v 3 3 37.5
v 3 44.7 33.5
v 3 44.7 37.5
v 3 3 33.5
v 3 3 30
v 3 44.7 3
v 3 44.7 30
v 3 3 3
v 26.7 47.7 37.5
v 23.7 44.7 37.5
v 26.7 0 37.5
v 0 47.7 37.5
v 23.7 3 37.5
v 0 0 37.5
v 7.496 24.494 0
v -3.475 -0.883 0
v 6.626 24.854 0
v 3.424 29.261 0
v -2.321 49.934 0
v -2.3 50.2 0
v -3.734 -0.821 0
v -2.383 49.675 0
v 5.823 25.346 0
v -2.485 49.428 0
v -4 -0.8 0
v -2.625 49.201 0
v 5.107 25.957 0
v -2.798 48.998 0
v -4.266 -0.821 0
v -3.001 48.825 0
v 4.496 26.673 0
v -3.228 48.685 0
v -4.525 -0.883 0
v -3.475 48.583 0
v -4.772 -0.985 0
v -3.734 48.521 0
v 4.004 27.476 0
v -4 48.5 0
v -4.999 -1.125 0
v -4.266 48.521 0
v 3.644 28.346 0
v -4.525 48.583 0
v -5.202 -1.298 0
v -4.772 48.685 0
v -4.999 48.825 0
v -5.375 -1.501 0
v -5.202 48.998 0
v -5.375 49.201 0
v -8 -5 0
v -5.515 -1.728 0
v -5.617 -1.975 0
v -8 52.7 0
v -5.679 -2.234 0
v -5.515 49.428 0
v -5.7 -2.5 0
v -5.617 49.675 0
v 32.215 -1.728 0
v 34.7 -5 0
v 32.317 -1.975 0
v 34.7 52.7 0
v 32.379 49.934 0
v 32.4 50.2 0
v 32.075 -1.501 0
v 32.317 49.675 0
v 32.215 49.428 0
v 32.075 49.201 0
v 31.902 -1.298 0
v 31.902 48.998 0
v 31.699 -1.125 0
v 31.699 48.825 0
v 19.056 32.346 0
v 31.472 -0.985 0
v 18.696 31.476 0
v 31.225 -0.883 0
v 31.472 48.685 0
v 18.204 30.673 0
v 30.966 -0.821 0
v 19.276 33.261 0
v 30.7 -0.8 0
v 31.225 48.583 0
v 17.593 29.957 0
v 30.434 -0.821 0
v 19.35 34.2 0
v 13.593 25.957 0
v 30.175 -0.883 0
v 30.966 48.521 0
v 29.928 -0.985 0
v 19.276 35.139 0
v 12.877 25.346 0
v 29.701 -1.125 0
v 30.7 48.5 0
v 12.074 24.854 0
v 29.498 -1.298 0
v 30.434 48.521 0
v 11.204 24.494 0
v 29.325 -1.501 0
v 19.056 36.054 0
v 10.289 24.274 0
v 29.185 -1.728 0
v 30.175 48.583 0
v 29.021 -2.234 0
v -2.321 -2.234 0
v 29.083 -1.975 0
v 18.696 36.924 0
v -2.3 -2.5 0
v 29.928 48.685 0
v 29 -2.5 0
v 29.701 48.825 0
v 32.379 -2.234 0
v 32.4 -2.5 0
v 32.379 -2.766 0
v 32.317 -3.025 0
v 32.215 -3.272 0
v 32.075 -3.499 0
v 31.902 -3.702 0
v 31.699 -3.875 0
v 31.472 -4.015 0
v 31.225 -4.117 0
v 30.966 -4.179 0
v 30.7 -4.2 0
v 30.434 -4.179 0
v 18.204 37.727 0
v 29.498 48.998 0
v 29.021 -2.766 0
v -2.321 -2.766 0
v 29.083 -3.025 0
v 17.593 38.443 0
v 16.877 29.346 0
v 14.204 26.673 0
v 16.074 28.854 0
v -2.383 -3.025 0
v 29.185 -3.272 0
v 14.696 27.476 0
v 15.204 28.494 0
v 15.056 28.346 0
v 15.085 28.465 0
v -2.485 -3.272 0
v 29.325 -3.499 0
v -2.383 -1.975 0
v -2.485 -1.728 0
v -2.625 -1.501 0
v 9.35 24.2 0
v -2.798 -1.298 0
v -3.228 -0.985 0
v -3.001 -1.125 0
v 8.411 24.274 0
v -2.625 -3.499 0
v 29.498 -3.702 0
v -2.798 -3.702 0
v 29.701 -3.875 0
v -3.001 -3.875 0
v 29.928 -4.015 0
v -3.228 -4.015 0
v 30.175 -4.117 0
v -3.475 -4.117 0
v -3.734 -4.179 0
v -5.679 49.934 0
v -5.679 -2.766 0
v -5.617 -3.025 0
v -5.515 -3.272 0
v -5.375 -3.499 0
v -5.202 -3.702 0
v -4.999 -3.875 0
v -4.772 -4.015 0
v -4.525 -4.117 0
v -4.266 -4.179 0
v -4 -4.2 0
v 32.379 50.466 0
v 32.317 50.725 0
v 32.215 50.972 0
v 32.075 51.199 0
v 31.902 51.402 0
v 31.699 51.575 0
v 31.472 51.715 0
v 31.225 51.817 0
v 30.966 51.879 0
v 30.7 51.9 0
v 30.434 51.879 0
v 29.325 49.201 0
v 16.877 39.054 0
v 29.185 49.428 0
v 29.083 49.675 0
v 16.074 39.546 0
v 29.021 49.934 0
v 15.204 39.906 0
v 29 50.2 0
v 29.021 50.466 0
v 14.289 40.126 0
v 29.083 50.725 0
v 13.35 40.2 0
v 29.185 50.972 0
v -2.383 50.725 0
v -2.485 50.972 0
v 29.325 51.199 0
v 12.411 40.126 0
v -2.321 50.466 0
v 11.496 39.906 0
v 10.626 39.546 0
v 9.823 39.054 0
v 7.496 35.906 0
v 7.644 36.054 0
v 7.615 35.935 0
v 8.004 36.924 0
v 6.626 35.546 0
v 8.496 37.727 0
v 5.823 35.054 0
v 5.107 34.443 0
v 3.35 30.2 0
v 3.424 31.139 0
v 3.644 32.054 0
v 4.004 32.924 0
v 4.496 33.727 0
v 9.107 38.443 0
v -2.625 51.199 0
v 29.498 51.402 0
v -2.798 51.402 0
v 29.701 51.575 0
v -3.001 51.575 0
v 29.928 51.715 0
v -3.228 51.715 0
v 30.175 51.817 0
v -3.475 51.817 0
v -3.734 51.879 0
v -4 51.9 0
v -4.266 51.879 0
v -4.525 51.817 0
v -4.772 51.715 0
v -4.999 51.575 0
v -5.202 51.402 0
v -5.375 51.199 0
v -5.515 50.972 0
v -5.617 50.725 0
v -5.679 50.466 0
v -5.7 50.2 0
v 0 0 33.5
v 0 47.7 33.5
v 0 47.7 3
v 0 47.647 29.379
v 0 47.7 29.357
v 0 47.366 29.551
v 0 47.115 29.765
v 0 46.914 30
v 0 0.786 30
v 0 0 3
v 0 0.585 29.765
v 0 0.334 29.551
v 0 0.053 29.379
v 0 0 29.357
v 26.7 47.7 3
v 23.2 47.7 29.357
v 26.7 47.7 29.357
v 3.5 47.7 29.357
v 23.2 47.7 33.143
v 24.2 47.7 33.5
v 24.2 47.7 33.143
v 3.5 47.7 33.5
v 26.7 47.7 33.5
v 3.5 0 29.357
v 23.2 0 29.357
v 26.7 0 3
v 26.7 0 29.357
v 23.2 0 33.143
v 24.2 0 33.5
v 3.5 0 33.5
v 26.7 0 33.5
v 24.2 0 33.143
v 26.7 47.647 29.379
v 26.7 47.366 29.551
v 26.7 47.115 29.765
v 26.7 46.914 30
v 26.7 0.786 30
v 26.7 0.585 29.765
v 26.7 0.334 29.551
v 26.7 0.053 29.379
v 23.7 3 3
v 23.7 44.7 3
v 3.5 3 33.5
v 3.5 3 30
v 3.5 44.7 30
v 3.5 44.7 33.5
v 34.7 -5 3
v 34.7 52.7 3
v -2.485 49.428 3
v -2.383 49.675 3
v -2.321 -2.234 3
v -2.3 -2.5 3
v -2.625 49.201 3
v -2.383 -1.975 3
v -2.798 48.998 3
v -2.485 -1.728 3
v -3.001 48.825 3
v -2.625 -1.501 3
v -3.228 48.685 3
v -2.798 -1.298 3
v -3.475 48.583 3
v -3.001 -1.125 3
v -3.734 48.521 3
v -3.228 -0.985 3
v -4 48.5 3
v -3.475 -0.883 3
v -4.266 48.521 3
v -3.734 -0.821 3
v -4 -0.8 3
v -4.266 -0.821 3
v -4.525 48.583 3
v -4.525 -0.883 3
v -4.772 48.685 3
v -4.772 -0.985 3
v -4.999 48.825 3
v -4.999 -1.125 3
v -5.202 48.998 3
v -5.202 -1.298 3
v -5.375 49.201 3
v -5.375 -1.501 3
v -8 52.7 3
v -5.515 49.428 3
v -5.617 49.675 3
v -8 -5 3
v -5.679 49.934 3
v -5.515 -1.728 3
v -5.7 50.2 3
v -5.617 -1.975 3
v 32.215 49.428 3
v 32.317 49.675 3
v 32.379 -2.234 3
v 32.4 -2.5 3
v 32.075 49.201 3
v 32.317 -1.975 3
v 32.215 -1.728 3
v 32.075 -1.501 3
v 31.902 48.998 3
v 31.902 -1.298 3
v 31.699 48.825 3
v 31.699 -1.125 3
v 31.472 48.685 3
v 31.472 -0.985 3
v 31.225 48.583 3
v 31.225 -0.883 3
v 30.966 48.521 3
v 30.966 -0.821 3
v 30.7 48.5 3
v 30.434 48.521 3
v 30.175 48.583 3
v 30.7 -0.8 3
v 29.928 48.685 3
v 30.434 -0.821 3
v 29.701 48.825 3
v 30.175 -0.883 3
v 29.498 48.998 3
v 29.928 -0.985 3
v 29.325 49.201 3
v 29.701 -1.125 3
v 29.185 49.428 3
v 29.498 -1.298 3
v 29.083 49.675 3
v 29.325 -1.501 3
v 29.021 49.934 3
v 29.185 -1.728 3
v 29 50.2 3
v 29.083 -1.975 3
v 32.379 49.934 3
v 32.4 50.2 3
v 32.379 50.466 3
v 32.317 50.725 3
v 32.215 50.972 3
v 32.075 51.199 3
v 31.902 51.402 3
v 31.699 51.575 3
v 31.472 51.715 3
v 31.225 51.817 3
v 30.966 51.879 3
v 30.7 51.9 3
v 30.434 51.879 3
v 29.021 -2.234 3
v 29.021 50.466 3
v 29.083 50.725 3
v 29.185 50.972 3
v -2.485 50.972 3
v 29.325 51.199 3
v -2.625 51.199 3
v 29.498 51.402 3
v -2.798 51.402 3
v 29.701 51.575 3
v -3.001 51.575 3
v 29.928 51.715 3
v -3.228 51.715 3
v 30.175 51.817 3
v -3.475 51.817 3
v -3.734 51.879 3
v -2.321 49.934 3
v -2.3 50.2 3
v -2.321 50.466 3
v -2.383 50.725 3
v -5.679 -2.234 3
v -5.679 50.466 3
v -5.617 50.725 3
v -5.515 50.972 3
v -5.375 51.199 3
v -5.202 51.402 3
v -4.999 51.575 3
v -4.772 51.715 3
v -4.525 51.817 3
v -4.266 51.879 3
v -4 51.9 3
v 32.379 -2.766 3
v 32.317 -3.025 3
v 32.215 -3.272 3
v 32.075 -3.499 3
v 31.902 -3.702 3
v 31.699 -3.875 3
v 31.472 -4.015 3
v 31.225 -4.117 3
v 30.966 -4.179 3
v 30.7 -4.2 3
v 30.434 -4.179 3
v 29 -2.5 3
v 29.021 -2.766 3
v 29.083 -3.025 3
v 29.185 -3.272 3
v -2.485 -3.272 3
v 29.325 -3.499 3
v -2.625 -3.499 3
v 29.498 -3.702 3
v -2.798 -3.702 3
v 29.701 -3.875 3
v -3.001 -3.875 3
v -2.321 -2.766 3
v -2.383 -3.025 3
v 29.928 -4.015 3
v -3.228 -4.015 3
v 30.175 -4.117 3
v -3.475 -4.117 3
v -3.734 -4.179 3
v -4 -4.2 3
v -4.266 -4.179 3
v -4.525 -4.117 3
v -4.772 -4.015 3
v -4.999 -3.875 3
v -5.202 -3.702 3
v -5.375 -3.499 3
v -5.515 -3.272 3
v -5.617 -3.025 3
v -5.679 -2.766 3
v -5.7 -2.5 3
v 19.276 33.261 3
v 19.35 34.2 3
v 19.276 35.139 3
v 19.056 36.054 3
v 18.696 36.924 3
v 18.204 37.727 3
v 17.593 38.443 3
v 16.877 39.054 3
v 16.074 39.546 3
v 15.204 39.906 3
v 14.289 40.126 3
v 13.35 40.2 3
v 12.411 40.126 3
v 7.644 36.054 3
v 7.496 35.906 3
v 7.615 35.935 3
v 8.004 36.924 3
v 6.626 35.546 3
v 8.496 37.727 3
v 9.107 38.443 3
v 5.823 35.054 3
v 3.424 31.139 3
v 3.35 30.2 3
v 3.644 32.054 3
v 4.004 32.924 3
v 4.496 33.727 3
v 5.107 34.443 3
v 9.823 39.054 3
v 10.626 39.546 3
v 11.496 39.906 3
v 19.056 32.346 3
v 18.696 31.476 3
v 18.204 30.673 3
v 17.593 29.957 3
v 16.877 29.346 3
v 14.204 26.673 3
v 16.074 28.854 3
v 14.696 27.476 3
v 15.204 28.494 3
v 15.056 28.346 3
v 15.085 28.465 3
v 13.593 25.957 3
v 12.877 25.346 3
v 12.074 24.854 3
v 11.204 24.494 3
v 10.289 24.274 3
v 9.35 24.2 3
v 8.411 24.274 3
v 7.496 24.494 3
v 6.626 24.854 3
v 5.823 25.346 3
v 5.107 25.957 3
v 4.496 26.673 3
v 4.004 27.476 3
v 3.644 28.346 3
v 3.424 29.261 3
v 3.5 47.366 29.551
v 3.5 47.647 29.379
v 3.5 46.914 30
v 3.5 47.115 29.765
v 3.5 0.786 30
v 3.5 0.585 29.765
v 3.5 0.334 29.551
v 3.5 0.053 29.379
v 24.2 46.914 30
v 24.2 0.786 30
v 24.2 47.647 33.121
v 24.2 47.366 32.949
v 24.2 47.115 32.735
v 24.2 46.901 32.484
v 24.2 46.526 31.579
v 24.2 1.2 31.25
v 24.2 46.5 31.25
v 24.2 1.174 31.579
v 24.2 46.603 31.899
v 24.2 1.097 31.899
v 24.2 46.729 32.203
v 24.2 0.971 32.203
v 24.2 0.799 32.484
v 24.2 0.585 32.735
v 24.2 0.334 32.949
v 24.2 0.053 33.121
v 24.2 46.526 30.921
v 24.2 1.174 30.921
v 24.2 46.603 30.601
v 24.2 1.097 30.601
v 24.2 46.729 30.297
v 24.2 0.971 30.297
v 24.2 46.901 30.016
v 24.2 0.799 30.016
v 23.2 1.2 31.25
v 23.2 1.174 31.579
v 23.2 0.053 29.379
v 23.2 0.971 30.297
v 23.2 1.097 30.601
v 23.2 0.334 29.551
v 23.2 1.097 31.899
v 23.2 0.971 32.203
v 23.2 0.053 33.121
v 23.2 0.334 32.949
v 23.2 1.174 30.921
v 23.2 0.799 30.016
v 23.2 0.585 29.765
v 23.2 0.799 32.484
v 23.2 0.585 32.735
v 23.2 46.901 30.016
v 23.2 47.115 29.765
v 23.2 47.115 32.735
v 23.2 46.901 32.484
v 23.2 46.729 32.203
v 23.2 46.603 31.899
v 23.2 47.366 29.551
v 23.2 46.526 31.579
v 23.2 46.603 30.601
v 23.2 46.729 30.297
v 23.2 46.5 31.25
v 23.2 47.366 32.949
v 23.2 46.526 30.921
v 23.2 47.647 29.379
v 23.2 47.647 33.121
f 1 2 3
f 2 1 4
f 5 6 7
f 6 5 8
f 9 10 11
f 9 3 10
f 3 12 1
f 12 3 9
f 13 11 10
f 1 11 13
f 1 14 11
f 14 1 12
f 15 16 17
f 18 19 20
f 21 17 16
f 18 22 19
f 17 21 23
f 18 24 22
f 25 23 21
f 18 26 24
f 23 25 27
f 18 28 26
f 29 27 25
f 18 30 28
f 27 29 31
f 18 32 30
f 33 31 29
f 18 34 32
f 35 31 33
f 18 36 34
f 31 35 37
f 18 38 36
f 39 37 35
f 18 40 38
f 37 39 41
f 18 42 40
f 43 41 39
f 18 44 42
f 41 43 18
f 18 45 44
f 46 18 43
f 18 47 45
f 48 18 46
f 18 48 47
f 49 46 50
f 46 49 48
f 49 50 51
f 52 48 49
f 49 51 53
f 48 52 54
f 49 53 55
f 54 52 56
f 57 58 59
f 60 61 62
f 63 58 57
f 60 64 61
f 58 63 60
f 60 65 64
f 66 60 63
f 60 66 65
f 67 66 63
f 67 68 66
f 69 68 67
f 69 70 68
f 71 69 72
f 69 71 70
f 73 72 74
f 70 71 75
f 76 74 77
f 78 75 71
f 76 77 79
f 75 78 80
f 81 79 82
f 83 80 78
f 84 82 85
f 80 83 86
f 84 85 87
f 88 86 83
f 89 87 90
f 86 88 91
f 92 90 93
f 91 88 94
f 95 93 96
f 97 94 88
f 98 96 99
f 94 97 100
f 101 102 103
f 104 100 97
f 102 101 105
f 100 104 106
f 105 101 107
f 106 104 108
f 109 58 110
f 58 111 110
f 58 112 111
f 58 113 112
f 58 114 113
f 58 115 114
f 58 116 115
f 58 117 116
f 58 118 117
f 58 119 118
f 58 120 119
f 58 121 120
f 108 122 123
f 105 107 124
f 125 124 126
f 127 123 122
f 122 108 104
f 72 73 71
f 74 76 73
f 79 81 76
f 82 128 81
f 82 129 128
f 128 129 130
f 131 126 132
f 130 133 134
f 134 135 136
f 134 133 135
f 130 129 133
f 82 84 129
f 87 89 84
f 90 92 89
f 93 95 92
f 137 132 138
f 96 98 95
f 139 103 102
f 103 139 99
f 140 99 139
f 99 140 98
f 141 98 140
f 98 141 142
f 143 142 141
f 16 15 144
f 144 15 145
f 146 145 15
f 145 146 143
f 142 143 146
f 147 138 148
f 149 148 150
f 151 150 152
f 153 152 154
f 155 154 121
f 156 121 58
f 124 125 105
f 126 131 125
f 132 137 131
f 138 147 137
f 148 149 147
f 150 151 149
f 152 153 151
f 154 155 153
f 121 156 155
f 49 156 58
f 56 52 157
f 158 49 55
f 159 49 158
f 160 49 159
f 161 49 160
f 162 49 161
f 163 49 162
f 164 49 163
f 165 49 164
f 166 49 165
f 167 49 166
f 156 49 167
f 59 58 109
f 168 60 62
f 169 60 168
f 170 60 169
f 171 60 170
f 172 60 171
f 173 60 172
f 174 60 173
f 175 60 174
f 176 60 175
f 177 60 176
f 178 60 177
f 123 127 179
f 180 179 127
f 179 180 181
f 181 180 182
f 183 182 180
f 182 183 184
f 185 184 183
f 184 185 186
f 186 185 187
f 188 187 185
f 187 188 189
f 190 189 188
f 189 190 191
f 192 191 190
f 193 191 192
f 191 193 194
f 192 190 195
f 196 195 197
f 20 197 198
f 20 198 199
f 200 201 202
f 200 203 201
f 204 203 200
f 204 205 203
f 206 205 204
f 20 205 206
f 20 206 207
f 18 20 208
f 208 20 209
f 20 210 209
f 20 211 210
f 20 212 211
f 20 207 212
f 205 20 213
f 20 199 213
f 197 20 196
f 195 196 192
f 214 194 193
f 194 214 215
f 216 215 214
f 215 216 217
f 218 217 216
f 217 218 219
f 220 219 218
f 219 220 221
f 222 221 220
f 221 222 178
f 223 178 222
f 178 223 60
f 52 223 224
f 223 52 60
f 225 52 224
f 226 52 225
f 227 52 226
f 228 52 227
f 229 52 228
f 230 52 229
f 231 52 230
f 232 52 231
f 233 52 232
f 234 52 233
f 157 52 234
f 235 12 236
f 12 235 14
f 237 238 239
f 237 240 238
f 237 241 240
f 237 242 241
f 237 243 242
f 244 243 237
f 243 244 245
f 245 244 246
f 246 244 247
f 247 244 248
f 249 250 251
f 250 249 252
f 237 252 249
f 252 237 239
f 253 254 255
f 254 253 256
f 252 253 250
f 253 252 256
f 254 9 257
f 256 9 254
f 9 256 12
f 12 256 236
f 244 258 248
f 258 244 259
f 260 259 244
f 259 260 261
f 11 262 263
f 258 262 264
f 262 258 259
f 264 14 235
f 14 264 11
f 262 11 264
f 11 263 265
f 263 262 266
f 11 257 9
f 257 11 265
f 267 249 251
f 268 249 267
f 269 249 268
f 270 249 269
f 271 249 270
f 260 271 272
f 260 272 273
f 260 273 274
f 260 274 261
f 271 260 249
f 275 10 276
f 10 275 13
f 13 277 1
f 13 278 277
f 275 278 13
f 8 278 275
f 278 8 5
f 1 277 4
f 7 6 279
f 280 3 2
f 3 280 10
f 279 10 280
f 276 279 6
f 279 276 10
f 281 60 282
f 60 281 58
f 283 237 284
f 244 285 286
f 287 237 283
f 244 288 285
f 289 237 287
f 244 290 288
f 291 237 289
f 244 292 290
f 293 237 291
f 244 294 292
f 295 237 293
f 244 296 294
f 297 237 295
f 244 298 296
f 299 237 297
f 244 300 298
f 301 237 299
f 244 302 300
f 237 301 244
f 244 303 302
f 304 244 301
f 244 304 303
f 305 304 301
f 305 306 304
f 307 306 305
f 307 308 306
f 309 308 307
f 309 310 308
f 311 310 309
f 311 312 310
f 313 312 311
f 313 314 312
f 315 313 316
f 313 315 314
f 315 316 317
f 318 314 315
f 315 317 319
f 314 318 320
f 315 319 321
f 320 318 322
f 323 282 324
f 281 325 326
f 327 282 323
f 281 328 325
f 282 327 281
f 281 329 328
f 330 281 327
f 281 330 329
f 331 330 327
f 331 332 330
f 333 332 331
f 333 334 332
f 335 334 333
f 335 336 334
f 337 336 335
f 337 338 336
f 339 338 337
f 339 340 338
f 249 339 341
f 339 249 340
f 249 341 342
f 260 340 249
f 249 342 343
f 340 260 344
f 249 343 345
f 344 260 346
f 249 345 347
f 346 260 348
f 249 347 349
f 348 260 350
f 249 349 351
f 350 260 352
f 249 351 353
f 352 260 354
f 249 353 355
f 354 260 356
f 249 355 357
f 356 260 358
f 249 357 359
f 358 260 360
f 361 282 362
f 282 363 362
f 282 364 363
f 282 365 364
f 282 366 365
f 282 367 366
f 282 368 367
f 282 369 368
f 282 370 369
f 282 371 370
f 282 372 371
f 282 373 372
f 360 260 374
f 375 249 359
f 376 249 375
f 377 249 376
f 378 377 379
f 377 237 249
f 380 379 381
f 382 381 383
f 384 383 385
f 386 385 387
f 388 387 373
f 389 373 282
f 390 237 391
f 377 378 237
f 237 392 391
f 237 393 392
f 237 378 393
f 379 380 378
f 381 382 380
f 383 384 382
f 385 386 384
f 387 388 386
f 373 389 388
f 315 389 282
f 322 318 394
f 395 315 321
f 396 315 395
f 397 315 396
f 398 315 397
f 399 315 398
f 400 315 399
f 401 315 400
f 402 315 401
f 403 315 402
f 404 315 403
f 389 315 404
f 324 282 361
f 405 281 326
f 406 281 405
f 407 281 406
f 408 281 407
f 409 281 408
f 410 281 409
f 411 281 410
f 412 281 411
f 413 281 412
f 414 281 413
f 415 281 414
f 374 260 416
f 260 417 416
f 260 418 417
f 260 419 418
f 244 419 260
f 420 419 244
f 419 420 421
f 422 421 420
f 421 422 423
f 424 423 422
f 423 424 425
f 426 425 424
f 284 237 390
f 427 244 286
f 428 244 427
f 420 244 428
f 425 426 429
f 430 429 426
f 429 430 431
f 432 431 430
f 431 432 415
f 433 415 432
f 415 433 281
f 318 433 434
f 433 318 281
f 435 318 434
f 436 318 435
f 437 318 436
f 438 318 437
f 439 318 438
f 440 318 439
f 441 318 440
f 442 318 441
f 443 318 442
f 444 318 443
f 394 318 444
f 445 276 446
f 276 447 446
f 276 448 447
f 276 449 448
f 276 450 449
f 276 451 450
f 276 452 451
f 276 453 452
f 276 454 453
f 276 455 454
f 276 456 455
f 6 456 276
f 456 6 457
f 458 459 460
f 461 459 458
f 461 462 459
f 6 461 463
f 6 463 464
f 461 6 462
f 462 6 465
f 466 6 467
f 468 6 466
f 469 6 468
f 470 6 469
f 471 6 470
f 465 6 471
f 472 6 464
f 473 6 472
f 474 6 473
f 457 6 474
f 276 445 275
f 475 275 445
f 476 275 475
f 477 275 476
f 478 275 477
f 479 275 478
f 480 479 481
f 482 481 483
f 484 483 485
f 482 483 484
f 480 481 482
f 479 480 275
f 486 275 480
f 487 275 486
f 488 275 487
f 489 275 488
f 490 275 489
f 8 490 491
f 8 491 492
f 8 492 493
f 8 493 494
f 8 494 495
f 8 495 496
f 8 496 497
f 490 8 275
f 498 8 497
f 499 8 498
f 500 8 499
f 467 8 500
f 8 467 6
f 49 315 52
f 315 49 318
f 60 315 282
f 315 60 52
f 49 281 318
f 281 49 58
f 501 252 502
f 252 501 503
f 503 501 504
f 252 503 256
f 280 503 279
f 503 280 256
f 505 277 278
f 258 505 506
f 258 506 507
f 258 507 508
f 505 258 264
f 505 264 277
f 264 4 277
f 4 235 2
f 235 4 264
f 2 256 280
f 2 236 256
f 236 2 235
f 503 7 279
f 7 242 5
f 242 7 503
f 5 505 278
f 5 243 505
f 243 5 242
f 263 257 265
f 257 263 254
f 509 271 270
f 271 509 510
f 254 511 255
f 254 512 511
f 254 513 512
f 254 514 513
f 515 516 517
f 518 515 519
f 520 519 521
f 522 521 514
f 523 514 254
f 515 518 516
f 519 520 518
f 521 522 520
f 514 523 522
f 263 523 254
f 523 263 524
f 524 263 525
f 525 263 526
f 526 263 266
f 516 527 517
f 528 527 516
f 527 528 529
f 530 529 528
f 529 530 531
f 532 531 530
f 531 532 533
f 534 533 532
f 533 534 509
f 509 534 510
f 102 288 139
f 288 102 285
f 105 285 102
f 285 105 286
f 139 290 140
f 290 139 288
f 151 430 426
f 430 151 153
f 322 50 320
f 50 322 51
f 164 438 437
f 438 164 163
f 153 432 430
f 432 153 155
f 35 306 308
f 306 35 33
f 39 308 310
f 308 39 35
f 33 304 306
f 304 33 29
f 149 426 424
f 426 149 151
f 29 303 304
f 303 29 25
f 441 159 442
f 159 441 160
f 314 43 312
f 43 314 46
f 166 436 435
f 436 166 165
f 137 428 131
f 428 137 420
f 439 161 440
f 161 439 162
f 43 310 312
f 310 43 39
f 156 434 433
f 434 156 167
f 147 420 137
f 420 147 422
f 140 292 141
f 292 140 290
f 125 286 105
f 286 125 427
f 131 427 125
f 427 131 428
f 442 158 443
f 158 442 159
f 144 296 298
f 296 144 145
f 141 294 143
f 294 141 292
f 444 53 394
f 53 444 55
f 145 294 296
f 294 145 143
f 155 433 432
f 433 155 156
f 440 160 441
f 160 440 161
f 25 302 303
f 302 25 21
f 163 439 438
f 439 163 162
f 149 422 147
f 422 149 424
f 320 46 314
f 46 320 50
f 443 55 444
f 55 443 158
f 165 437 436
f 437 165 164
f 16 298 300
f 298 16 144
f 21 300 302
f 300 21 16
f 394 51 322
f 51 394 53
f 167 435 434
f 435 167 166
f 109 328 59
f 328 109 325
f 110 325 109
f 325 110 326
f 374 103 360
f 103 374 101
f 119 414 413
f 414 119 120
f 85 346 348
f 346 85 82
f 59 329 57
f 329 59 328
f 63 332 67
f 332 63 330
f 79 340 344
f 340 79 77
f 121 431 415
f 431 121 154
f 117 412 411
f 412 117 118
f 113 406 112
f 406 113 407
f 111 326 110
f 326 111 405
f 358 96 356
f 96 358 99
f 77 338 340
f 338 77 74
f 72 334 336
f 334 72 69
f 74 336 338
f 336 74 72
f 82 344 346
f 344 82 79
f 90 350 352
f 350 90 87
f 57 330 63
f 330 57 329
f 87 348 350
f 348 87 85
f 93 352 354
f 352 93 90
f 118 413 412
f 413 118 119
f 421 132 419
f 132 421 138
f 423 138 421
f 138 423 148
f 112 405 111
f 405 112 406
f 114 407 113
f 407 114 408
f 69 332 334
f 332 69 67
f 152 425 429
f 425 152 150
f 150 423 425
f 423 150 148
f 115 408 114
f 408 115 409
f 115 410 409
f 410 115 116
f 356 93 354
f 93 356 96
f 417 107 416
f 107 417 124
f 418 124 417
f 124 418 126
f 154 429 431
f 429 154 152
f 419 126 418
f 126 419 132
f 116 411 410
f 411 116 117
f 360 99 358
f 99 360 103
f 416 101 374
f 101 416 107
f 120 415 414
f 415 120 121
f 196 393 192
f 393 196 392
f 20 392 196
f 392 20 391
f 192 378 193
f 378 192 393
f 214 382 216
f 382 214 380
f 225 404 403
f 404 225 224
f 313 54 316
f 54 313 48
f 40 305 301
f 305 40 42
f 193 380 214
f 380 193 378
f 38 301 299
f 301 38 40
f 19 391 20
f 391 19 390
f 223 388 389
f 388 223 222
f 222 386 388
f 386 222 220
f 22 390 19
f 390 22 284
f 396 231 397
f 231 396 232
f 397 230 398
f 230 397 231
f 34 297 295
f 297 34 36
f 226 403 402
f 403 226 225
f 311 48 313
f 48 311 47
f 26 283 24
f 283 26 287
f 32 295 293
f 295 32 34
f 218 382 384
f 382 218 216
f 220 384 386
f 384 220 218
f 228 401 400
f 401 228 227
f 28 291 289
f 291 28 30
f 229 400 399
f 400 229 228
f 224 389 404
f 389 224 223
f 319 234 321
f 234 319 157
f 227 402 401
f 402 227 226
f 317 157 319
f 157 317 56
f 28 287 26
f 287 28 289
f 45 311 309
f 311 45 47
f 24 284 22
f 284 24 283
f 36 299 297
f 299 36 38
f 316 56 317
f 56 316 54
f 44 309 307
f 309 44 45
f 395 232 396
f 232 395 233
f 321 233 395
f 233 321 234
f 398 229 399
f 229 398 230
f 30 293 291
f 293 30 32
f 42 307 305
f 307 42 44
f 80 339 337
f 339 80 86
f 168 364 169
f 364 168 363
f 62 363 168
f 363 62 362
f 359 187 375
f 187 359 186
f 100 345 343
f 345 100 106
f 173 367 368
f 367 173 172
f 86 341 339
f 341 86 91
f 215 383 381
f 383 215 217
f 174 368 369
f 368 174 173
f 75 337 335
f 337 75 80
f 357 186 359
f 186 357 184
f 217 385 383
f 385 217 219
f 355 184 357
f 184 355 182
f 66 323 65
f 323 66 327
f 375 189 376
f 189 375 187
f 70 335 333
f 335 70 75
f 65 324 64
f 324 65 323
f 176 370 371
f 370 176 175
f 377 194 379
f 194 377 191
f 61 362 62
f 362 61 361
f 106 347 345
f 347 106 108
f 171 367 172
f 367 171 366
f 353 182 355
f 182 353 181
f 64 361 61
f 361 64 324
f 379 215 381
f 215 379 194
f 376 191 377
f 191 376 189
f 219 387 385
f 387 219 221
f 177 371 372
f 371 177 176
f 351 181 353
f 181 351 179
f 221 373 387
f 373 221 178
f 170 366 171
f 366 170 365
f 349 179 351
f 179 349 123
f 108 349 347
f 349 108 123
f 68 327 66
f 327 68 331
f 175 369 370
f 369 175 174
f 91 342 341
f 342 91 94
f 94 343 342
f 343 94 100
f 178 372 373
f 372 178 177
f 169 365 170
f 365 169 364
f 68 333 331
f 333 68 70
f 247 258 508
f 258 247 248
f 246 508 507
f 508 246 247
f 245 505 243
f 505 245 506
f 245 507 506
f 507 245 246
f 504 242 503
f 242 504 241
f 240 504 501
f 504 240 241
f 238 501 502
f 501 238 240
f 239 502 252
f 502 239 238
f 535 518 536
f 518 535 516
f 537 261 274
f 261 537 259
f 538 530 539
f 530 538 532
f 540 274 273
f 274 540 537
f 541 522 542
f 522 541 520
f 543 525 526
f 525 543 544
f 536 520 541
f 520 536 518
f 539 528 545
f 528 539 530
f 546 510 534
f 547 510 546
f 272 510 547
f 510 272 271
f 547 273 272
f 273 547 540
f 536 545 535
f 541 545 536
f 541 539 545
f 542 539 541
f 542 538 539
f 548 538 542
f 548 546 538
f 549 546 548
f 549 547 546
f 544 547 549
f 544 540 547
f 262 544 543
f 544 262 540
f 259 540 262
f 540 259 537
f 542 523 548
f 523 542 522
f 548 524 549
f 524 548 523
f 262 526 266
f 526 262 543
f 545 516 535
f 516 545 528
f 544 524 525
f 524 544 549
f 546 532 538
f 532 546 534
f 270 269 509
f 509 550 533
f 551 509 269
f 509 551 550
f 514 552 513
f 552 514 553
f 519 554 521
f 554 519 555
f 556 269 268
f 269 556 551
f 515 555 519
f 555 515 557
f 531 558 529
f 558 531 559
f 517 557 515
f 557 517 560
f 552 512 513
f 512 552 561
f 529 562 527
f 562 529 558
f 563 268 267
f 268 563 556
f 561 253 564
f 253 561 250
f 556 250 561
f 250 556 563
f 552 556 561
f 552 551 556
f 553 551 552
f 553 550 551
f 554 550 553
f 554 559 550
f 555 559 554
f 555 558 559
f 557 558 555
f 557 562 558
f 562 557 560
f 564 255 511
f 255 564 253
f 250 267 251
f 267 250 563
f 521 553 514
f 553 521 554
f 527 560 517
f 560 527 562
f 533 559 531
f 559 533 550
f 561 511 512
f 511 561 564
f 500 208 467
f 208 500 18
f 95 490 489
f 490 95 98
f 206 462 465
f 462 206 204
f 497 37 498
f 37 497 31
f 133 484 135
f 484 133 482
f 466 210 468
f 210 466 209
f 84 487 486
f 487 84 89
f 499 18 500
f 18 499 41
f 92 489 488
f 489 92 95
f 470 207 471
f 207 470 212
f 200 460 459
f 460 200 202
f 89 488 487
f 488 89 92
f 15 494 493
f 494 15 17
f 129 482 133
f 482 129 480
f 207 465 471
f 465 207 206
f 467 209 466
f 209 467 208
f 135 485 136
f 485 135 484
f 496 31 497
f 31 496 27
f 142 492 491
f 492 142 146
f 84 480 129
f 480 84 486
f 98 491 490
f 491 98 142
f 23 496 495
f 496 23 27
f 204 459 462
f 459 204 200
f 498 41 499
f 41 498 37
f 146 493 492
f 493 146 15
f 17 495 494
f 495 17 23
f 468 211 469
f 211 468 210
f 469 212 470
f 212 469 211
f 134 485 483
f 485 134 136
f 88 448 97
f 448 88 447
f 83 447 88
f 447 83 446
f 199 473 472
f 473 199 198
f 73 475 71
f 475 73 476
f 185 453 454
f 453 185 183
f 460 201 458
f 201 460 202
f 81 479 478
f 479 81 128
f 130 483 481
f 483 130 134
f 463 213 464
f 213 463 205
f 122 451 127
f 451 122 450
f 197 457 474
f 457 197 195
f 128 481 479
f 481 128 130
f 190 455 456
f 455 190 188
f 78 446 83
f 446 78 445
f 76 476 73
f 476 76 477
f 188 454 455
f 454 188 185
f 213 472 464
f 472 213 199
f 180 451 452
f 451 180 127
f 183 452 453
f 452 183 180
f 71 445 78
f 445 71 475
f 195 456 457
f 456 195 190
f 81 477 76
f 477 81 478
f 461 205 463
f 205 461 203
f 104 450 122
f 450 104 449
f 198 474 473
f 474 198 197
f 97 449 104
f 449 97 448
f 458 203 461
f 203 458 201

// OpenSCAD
// FoldIt Robot - Servo Mount Bracket for MG996R
// MG996R dimensions: 40.7mm x 19.7mm x 42.9mm
// Mounting tab holes: 49.5mm apart (center to center), 4.8mm holes
// Shaft offset: 10mm from one end
// This bracket holds the servo so its horn connects to the folding panel

$fn = 40;

// MG996R servo dimensions
servo_body_w = 19.7;      // width
servo_body_l = 40.7;      // length
servo_body_h = 42.9;      // height (including gear box)
servo_tab_l = 54.5;       // total length including mounting tabs
servo_tab_w = 19.7;       // tab width (same as body)
servo_tab_h = 2.5;        // tab thickness
servo_tab_offset = 27.0;  // distance from bottom to tab underside
servo_hole_spacing = 49.5; // distance between mounting holes
servo_hole_d = 4.8;       // mounting hole diameter
servo_shaft_offset = 10;  // shaft center offset from one end

// Bracket parameters
wall = 3;
bracket_clearance = 0.5;  // clearance around servo body
bracket_inner_w = servo_body_w + bracket_clearance * 2;
bracket_inner_l = servo_body_l + bracket_clearance * 2;
bracket_outer_w = bracket_inner_w + wall * 2;
bracket_outer_l = bracket_inner_l + wall * 2;
bracket_h = servo_tab_offset + servo_tab_h + 5; // height up to tabs + 5mm wall above for retention

// Base plate mounting
base_plate_w = bracket_outer_w + 16;  // extra width for mounting flanges
base_plate_l = bracket_outer_l + 10;
base_plate_h = wall;

// Horn clearance
horn_slot_w = 8;
horn_slot_l = 30;

m3_hole = 3.4;            // M3 clearance for base plate mounting
m4_hole = 4.2;            // M4 clearance for servo tab screws (servo tabs are 4.8mm)

module servo_mount() {
    difference() {
        union() {
            // Base mounting plate
            translate([-(base_plate_w - bracket_outer_w) / 2,
                       -(base_plate_l - bracket_outer_l) / 2, 0])
                cube([base_plate_w, base_plate_l, base_plate_h]);

            // Servo cradle walls
            _servo_cradle();
        }

        // Servo body cavity
        translate([wall, wall, base_plate_h])
            cube([bracket_inner_w, bracket_inner_l, bracket_h]);

        // Tab slots on both sides (so servo drops in from top, tabs rest on cradle)
        _tab_slots();

        // Horn clearance slot on top (for servo horn to protrude)
        translate([bracket_outer_w / 2 - horn_slot_w / 2,
                   wall + bracket_clearance + servo_body_l - servo_shaft_offset - horn_slot_w / 2,
                   -0.5])
            cylinder(d=horn_slot_w + 4, h=base_plate_h + 1);

        // Shaft hole through base plate (so horn can reach below)
        translate([bracket_outer_w / 2,
                   wall + bracket_clearance + servo_body_l - servo_shaft_offset,
                   -0.5])
            cylinder(d=12, h=base_plate_h + 1);

        // Base plate mounting holes (4 corners of the flange)
        _base_mounting_holes();

        // Servo mounting screw holes (through cradle walls into servo tabs)
        _servo_screw_holes();
    }
}

module _servo_cradle() {
    // Four walls forming the cradle
    cradle_total_h = base_plate_h + bracket_h;

    // Left wall
    cube([wall, bracket_outer_l, cradle_total_h]);

    // Right wall
    translate([wall + bracket_inner_w, 0, 0])
        cube([wall, bracket_outer_l, cradle_total_h]);

    // Front wall
    cube([bracket_outer_w, wall, cradle_total_h]);

    // Back wall
    translate([0, wall + bracket_inner_l, 0])
        cube([bracket_outer_w, wall, cradle_total_h]);
}

module _tab_slots() {
    // Horizontal slots for the servo mounting tabs to rest in
    tab_slot_h = servo_tab_h + 1;
    tab_extend = 10;  // how far tabs extend beyond servo body

    // Left and right tab slots
    for (side = [0, 1]) {
        x_pos = side == 0 ? -0.5 : bracket_outer_w - wall + 0.5;
        translate([x_pos,
                   wall + bracket_clearance - tab_extend / 2,
                   base_plate_h + servo_tab_offset])
            cube([wall + 1, bracket_inner_l + tab_extend, tab_slot_h]);
    }
}

module _base_mounting_holes() {
    flange_x = (base_plate_w - bracket_outer_w) / 2;
    flange_y = (base_plate_l - bracket_outer_l) / 2;

    // 4 holes in the mounting flanges
    positions = [
        [-flange_x / 2, -flange_y / 2],
        [bracket_outer_w + flange_x / 2, -flange_y / 2],
        [-flange_x / 2, bracket_outer_l + flange_y / 2],
        [bracket_outer_w + flange_x / 2, bracket_outer_l + flange_y / 2]
    ];

    for (pos = positions) {
        translate([pos[0], pos[1], -0.5])
            cylinder(d=m3_hole, h=base_plate_h + 1);
    }
}

module _servo_screw_holes() {
    // M4 holes through the cradle walls that align with servo tab holes (4.8mm)
    screw_z = base_plate_h + servo_tab_offset + servo_tab_h / 2;
    hole_y1 = wall + bracket_clearance + (servo_body_l - servo_hole_spacing) / 2;
    hole_y2 = hole_y1 + servo_hole_spacing;

    // Through left wall
    for (y = [hole_y1, hole_y2]) {
        translate([-0.5, y, screw_z])
            rotate([0, 90, 0])
                cylinder(d=m4_hole, h=wall + 1);
    }

    // Through right wall
    for (y = [hole_y1, hole_y2]) {
        translate([wall + bracket_inner_w - 0.5, y, screw_z])
            rotate([0, 90, 0])
                cylinder(d=m4_hole, h=wall + 1);
    }
}

// Render when opened directly
servo_mount();
